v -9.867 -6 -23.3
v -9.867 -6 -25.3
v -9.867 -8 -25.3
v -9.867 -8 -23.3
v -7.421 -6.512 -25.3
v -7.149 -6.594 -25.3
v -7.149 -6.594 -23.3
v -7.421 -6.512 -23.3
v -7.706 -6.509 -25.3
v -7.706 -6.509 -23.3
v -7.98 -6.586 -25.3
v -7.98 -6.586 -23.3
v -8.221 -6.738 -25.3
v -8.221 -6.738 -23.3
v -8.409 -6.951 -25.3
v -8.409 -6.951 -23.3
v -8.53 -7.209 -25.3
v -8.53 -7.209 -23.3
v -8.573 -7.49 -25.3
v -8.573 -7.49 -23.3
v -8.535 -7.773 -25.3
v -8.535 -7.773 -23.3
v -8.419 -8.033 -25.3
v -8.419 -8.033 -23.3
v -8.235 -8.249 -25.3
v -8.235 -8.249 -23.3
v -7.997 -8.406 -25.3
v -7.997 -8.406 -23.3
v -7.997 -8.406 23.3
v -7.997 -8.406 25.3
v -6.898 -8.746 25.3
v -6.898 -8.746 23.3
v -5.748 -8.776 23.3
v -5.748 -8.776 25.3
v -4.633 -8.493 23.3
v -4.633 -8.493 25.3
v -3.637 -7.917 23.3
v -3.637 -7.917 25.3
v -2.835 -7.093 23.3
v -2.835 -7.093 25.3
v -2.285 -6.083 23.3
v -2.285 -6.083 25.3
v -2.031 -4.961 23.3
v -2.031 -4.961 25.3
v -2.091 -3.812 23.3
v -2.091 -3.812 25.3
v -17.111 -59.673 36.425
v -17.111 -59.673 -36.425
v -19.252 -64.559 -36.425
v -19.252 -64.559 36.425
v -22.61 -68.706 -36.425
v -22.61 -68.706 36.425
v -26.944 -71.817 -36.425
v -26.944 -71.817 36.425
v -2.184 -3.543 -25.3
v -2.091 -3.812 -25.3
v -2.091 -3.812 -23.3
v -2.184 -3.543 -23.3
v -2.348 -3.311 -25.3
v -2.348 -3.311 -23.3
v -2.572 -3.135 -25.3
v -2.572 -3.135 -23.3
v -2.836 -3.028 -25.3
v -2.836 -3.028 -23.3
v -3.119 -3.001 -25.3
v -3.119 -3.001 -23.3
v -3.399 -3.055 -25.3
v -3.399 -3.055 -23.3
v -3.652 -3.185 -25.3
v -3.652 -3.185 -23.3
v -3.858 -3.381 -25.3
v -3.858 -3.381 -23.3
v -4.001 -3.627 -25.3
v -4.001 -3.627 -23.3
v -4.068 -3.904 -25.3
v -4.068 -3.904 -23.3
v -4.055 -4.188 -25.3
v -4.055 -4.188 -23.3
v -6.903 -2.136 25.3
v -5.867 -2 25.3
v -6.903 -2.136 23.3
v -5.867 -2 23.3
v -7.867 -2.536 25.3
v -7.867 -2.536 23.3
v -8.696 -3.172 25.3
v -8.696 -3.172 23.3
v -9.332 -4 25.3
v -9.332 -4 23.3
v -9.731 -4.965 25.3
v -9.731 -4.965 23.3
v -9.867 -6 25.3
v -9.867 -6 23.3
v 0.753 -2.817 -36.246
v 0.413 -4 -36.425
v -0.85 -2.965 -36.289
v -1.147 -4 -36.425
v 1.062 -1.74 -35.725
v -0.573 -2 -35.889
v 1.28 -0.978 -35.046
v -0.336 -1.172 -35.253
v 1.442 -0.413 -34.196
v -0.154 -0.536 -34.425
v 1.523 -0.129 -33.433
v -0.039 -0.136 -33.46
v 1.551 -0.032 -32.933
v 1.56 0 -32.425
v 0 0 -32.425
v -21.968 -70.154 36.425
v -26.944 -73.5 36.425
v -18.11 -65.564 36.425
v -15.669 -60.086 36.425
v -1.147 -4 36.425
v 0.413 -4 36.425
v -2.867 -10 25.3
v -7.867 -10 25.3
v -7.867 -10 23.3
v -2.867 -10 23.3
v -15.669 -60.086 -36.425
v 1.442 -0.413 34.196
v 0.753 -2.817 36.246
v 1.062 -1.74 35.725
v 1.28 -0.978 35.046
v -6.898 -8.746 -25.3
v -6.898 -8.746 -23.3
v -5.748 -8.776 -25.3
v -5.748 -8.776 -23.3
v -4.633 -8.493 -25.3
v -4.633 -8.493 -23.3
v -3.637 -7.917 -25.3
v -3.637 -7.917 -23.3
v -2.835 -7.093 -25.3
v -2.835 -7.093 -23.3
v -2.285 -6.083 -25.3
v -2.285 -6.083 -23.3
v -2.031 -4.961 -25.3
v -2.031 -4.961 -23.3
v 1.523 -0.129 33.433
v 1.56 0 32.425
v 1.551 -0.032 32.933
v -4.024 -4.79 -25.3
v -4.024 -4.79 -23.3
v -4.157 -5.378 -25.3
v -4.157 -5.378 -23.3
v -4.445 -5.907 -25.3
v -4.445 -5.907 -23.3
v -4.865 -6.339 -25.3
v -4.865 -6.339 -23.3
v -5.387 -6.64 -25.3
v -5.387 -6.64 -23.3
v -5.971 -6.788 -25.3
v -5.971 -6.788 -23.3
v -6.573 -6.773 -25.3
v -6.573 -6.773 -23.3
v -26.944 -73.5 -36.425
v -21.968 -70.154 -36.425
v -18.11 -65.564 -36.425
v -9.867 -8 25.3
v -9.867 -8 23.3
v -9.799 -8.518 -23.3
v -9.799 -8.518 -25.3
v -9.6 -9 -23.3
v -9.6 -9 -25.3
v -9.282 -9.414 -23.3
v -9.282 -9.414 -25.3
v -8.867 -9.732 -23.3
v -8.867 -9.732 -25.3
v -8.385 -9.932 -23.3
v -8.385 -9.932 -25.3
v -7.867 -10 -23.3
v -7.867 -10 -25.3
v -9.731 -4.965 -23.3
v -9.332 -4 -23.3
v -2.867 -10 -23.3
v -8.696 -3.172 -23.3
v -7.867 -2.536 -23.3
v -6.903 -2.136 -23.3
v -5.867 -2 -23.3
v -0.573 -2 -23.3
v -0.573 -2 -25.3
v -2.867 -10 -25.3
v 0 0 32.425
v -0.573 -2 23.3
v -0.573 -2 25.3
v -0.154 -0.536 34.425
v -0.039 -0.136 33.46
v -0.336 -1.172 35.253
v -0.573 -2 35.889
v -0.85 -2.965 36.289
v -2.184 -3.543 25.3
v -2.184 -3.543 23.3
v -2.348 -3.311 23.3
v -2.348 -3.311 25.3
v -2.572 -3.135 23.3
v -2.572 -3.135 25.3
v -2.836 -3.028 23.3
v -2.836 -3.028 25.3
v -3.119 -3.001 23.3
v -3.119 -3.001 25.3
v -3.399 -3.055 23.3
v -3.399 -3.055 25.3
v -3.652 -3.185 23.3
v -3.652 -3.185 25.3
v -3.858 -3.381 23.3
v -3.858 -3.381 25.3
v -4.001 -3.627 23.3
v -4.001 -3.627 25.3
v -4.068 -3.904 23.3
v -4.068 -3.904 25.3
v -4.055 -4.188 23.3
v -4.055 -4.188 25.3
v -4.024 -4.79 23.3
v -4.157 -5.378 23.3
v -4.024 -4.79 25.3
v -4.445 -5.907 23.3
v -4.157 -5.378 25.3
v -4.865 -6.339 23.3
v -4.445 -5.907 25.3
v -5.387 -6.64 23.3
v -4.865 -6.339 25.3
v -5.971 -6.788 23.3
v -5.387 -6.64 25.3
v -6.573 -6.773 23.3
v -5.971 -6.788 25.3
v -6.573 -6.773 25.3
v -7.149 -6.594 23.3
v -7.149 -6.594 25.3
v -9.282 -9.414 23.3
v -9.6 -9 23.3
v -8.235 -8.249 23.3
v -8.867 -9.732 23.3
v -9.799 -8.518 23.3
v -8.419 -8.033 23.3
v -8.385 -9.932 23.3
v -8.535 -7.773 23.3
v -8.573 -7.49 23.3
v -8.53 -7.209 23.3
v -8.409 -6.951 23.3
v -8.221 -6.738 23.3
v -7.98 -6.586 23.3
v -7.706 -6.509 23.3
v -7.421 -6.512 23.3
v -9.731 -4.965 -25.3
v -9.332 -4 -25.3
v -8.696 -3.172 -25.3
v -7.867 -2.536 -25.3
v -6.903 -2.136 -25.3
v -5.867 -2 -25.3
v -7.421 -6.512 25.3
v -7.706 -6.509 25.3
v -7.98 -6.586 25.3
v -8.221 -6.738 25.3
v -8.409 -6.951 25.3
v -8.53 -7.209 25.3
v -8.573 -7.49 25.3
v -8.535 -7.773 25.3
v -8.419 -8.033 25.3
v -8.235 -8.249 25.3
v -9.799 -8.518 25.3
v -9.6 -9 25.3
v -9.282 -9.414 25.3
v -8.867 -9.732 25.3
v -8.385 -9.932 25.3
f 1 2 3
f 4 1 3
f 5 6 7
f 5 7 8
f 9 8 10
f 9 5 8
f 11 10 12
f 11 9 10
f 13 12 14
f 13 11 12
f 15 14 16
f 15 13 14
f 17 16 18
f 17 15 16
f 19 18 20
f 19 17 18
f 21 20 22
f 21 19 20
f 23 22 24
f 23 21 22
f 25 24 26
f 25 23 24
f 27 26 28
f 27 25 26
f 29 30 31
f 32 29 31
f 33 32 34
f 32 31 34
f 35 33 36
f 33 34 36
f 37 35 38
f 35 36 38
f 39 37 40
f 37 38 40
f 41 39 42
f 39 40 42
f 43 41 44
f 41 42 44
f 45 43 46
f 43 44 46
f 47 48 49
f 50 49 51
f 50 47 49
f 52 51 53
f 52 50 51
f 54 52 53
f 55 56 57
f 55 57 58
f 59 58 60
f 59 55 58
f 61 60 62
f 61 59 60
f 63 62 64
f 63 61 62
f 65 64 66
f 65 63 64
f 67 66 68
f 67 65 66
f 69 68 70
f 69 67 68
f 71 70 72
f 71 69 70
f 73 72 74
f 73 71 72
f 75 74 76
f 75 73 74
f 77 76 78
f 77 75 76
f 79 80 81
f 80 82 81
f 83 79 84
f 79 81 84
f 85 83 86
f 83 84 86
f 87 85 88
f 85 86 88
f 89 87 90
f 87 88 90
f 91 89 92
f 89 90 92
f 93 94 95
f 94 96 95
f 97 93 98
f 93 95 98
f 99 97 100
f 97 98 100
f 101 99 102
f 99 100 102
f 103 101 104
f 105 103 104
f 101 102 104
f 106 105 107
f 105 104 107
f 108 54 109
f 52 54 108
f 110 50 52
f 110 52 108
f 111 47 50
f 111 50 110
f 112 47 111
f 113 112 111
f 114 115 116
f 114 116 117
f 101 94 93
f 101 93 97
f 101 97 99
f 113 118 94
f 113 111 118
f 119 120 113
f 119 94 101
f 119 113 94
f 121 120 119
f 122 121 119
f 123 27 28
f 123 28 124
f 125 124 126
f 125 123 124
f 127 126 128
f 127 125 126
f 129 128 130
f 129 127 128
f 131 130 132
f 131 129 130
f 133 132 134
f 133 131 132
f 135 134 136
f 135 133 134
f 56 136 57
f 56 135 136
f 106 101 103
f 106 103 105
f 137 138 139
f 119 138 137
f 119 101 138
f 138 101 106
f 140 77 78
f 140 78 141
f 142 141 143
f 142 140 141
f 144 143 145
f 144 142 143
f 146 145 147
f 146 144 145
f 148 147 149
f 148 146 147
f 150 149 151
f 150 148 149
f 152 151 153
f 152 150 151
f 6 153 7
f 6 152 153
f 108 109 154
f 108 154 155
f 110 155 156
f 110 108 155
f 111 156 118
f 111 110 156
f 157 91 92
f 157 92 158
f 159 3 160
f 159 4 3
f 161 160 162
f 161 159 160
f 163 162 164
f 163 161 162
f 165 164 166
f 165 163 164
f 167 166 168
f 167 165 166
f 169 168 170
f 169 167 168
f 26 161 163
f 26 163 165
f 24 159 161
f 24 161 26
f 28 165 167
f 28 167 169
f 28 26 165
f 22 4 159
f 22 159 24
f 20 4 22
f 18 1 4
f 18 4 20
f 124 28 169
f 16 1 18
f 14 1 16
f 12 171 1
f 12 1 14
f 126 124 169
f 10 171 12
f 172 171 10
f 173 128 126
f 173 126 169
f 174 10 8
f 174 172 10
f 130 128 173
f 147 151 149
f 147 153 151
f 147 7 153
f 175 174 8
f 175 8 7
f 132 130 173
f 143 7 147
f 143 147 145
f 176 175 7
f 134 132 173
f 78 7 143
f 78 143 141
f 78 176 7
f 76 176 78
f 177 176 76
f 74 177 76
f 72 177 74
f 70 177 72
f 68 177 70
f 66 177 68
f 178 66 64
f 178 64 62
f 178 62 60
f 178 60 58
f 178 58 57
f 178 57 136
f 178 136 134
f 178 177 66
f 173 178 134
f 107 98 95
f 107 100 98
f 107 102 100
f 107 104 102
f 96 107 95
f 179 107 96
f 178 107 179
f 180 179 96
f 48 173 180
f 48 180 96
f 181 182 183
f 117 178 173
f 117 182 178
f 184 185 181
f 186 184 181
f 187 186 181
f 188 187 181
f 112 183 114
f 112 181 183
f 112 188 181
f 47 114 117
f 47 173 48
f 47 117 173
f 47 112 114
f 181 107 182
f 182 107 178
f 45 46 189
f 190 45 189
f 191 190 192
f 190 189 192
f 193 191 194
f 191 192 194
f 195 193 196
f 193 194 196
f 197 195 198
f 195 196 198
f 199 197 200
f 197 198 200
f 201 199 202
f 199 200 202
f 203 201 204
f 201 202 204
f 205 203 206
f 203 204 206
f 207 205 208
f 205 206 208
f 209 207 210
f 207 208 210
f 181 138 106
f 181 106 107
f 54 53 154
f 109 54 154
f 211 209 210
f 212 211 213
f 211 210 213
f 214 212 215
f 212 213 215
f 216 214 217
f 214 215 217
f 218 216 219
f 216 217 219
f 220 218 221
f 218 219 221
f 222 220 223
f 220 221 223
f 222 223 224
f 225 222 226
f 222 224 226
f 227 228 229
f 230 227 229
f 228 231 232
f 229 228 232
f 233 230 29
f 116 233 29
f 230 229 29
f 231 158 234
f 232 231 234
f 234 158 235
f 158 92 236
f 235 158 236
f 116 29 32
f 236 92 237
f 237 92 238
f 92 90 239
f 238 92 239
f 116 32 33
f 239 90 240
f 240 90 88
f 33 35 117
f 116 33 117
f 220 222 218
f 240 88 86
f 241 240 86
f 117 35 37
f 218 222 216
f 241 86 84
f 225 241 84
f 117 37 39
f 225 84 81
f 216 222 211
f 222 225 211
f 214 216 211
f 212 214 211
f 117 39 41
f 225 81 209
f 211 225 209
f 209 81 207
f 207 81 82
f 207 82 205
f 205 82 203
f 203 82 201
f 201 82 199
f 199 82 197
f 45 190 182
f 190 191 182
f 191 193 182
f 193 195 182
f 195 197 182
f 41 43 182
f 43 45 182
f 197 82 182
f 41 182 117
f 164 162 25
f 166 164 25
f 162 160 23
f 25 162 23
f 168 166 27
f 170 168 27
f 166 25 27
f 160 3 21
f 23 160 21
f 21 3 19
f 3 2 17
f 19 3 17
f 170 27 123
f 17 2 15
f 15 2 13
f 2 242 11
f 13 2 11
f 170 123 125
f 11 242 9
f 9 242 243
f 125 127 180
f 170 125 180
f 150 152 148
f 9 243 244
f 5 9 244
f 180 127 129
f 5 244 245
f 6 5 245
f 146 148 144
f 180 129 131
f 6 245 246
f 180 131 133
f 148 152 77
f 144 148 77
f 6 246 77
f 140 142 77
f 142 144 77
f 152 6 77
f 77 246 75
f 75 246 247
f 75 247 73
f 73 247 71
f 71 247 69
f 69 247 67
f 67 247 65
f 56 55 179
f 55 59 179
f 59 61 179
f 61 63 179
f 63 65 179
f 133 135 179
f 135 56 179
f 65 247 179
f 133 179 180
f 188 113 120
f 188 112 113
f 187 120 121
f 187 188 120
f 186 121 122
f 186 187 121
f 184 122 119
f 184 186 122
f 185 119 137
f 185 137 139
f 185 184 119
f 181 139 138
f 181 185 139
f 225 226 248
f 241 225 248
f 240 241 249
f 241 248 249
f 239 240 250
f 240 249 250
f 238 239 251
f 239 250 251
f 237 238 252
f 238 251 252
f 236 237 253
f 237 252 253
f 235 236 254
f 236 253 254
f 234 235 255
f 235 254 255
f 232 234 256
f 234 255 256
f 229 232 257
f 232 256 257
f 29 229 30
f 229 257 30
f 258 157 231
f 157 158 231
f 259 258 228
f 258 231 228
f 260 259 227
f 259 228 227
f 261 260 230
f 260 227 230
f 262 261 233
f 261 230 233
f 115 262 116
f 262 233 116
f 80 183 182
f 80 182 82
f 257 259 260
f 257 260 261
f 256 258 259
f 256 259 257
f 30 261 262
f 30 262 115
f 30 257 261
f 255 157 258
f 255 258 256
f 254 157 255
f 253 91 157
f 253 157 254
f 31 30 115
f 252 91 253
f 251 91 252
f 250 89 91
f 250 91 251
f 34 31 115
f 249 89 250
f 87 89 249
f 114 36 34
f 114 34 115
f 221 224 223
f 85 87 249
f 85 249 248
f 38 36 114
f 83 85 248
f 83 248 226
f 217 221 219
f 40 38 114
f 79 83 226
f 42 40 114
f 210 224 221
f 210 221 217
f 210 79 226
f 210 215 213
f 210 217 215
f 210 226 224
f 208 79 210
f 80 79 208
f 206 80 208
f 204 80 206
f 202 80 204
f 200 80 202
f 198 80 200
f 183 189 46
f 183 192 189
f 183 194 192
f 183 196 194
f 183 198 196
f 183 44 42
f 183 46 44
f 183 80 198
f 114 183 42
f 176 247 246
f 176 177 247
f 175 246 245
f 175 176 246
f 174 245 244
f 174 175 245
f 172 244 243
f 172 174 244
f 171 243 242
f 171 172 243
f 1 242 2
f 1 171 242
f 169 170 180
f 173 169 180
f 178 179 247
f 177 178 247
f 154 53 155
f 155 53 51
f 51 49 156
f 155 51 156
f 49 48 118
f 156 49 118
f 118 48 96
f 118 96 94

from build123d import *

# Parameters (mm, degrees)
BOSS_EXTRUDE1_DEPTH   = 36.425
CUT_EXTRUDE1_DEPTH    = 110.090212662
CUT_EXTRUDE2_DEPTH    = 109.098783751
FILLET1_R             = 4
BOSS_EXTRUDE14_START  = 25.3
BOSS_EXTRUDE14_DEPTH  = 2
CUT_EXTRUDE10_DEPTH   = 5
FILLET13_R            = 4
FILLET14_R            = 2
FILLET13_OF_MIRROR1_R = 4
FILLET14_OF_MIRROR1_R = 2


with BuildPart() as part:
    # Sketch1 → Boss-Extrude1 (new, symmetric)
    with BuildSketch(Plane.XY):
        with BuildLine():
            Line((0, 0), (-17.110884891, -59.672747116))
            ThreePointArc((-17.110884891, -59.672747116), (-22.347799076, -68.454296451), (-31.240591359, -73.5))
            Line((-31.240591359, -73.5), (-30.858426801, -74.9505))
            ThreePointArc((-30.858426801, -74.9505), (-21.298675096, -69.526368685), (-15.668992347, -60.08620315))
            Line((-15.668992347, -60.08620315), (1.441892544, -0.413456034))
            Line((1.441892544, -0.413456034), (1.560449154, 0))
            Line((1.560449154, 0), (0, 0))
        make_face()
    extrude(amount=BOSS_EXTRUDE1_DEPTH, both=True)

    # Sketch2 → Cut-Extrude1 (cut, through all)
    with BuildSketch(Plane.XY.offset(36.425)):
        with BuildLine():
            Line((-31.240591359, -73.5), (-26.943866684, -73.5))
            ThreePointArc((-26.943866684, -73.5), (-28.865857957, -74.320486174), (-30.858426801, -74.9505))
            Line((-30.858426801, -74.9505), (-31.240591359, -73.5))
        make_face()
    extrude(amount=-CUT_EXTRUDE1_DEPTH, mode=Mode.SUBTRACT)

    # Sketch3 → Cut-Extrude2 (cut, through all)
    with BuildSketch(Plane.XY.offset(36.425)):
        with BuildLine():
            Line((-26.943866684, -73.5), (-31.240591359, -73.5))
            ThreePointArc((-31.240591359, -73.5), (-29.043541661, -72.783058785), (-26.943866684, -71.817451685))
            Line((-26.943866684, -71.817451685), (-26.943866684, -73.5))
        make_face()
    extrude(amount=-CUT_EXTRUDE2_DEPTH, mode=Mode.SUBTRACT)

    # Fillet1
    fillet1_edges = [part.edges().sort_by_distance(p)[0] for p in [
        (0.780224577, 0, 36.425),
        (0.780224577, 0, -36.425),
    ]]
    fillet(fillet1_edges, radius=FILLET1_R)

    # Sketch33 → Boss-Extrude14 (add)
    with BuildSketch(Plane.XY.offset(BOSS_EXTRUDE14_START)):
        Polygon((-0.573490772, -2), (-9.867453858, -2), (-9.867453858, -10), (-2.867453858, -10), align=None)
    boss_extrude14 = extrude(amount=-BOSS_EXTRUDE14_DEPTH)

    # Sketch34 → Cut-Extrude10 (cut)
    with BuildSketch(Plane.XY.offset(25.3)):
        with BuildLine():
            ThreePointArc((-2.090857418, -3.811861892), (-3.261138108, -3.017857418), (-4.055142582, -4.188138108))
            ThreePointArc((-4.055142582, -4.188138108), (-4.865186914, -6.338616825), (-7.148892582, -6.594388108))
            ThreePointArc((-7.148892582, -6.594388108), (-8.478611892, -7.075892582), (-7.997107418, -8.405611892))
            ThreePointArc((-7.997107418, -8.405611892), (-3.637305687, -7.91732126), (-2.090857418, -3.811861892))
        make_face()
    cut_extrude10 = extrude(amount=-CUT_EXTRUDE10_DEPTH, mode=Mode.SUBTRACT)

    # Fillet13
    fillet13_edges = [part.edges().sort_by_distance(p)[0] for p in [
        (-9.867453858, -2, 24.3),
    ]]
    fillet(fillet13_edges, radius=FILLET13_R)

    # Fillet14
    fillet14_edges = [part.edges().sort_by_distance(p)[0] for p in [
        (-9.867453858, -10, 24.3),
    ]]
    fillet(fillet14_edges, radius=FILLET14_R)

    # Mirror1: Boss-Extrude14, Cut-Extrude10 across plane
    add(boss_extrude14.mirror(Plane.XY))
    add(cut_extrude10.mirror(Plane.XY), mode=Mode.SUBTRACT)

    # Fillet13 of Mirror1
    fillet13_of_mirror1_edges = [part.edges().sort_by_distance(p)[0] for p in [
        (-9.867453858, -2, -24.3),
    ]]
    fillet(fillet13_of_mirror1_edges, radius=FILLET13_OF_MIRROR1_R)

    # Fillet14 of Mirror1
    fillet14_of_mirror1_edges = [part.edges().sort_by_distance(p)[0] for p in [
        (-9.867453858, -10, -24.3),
    ]]
    fillet(fillet14_of_mirror1_edges, radius=FILLET14_OF_MIRROR1_R)


solid = part.part
